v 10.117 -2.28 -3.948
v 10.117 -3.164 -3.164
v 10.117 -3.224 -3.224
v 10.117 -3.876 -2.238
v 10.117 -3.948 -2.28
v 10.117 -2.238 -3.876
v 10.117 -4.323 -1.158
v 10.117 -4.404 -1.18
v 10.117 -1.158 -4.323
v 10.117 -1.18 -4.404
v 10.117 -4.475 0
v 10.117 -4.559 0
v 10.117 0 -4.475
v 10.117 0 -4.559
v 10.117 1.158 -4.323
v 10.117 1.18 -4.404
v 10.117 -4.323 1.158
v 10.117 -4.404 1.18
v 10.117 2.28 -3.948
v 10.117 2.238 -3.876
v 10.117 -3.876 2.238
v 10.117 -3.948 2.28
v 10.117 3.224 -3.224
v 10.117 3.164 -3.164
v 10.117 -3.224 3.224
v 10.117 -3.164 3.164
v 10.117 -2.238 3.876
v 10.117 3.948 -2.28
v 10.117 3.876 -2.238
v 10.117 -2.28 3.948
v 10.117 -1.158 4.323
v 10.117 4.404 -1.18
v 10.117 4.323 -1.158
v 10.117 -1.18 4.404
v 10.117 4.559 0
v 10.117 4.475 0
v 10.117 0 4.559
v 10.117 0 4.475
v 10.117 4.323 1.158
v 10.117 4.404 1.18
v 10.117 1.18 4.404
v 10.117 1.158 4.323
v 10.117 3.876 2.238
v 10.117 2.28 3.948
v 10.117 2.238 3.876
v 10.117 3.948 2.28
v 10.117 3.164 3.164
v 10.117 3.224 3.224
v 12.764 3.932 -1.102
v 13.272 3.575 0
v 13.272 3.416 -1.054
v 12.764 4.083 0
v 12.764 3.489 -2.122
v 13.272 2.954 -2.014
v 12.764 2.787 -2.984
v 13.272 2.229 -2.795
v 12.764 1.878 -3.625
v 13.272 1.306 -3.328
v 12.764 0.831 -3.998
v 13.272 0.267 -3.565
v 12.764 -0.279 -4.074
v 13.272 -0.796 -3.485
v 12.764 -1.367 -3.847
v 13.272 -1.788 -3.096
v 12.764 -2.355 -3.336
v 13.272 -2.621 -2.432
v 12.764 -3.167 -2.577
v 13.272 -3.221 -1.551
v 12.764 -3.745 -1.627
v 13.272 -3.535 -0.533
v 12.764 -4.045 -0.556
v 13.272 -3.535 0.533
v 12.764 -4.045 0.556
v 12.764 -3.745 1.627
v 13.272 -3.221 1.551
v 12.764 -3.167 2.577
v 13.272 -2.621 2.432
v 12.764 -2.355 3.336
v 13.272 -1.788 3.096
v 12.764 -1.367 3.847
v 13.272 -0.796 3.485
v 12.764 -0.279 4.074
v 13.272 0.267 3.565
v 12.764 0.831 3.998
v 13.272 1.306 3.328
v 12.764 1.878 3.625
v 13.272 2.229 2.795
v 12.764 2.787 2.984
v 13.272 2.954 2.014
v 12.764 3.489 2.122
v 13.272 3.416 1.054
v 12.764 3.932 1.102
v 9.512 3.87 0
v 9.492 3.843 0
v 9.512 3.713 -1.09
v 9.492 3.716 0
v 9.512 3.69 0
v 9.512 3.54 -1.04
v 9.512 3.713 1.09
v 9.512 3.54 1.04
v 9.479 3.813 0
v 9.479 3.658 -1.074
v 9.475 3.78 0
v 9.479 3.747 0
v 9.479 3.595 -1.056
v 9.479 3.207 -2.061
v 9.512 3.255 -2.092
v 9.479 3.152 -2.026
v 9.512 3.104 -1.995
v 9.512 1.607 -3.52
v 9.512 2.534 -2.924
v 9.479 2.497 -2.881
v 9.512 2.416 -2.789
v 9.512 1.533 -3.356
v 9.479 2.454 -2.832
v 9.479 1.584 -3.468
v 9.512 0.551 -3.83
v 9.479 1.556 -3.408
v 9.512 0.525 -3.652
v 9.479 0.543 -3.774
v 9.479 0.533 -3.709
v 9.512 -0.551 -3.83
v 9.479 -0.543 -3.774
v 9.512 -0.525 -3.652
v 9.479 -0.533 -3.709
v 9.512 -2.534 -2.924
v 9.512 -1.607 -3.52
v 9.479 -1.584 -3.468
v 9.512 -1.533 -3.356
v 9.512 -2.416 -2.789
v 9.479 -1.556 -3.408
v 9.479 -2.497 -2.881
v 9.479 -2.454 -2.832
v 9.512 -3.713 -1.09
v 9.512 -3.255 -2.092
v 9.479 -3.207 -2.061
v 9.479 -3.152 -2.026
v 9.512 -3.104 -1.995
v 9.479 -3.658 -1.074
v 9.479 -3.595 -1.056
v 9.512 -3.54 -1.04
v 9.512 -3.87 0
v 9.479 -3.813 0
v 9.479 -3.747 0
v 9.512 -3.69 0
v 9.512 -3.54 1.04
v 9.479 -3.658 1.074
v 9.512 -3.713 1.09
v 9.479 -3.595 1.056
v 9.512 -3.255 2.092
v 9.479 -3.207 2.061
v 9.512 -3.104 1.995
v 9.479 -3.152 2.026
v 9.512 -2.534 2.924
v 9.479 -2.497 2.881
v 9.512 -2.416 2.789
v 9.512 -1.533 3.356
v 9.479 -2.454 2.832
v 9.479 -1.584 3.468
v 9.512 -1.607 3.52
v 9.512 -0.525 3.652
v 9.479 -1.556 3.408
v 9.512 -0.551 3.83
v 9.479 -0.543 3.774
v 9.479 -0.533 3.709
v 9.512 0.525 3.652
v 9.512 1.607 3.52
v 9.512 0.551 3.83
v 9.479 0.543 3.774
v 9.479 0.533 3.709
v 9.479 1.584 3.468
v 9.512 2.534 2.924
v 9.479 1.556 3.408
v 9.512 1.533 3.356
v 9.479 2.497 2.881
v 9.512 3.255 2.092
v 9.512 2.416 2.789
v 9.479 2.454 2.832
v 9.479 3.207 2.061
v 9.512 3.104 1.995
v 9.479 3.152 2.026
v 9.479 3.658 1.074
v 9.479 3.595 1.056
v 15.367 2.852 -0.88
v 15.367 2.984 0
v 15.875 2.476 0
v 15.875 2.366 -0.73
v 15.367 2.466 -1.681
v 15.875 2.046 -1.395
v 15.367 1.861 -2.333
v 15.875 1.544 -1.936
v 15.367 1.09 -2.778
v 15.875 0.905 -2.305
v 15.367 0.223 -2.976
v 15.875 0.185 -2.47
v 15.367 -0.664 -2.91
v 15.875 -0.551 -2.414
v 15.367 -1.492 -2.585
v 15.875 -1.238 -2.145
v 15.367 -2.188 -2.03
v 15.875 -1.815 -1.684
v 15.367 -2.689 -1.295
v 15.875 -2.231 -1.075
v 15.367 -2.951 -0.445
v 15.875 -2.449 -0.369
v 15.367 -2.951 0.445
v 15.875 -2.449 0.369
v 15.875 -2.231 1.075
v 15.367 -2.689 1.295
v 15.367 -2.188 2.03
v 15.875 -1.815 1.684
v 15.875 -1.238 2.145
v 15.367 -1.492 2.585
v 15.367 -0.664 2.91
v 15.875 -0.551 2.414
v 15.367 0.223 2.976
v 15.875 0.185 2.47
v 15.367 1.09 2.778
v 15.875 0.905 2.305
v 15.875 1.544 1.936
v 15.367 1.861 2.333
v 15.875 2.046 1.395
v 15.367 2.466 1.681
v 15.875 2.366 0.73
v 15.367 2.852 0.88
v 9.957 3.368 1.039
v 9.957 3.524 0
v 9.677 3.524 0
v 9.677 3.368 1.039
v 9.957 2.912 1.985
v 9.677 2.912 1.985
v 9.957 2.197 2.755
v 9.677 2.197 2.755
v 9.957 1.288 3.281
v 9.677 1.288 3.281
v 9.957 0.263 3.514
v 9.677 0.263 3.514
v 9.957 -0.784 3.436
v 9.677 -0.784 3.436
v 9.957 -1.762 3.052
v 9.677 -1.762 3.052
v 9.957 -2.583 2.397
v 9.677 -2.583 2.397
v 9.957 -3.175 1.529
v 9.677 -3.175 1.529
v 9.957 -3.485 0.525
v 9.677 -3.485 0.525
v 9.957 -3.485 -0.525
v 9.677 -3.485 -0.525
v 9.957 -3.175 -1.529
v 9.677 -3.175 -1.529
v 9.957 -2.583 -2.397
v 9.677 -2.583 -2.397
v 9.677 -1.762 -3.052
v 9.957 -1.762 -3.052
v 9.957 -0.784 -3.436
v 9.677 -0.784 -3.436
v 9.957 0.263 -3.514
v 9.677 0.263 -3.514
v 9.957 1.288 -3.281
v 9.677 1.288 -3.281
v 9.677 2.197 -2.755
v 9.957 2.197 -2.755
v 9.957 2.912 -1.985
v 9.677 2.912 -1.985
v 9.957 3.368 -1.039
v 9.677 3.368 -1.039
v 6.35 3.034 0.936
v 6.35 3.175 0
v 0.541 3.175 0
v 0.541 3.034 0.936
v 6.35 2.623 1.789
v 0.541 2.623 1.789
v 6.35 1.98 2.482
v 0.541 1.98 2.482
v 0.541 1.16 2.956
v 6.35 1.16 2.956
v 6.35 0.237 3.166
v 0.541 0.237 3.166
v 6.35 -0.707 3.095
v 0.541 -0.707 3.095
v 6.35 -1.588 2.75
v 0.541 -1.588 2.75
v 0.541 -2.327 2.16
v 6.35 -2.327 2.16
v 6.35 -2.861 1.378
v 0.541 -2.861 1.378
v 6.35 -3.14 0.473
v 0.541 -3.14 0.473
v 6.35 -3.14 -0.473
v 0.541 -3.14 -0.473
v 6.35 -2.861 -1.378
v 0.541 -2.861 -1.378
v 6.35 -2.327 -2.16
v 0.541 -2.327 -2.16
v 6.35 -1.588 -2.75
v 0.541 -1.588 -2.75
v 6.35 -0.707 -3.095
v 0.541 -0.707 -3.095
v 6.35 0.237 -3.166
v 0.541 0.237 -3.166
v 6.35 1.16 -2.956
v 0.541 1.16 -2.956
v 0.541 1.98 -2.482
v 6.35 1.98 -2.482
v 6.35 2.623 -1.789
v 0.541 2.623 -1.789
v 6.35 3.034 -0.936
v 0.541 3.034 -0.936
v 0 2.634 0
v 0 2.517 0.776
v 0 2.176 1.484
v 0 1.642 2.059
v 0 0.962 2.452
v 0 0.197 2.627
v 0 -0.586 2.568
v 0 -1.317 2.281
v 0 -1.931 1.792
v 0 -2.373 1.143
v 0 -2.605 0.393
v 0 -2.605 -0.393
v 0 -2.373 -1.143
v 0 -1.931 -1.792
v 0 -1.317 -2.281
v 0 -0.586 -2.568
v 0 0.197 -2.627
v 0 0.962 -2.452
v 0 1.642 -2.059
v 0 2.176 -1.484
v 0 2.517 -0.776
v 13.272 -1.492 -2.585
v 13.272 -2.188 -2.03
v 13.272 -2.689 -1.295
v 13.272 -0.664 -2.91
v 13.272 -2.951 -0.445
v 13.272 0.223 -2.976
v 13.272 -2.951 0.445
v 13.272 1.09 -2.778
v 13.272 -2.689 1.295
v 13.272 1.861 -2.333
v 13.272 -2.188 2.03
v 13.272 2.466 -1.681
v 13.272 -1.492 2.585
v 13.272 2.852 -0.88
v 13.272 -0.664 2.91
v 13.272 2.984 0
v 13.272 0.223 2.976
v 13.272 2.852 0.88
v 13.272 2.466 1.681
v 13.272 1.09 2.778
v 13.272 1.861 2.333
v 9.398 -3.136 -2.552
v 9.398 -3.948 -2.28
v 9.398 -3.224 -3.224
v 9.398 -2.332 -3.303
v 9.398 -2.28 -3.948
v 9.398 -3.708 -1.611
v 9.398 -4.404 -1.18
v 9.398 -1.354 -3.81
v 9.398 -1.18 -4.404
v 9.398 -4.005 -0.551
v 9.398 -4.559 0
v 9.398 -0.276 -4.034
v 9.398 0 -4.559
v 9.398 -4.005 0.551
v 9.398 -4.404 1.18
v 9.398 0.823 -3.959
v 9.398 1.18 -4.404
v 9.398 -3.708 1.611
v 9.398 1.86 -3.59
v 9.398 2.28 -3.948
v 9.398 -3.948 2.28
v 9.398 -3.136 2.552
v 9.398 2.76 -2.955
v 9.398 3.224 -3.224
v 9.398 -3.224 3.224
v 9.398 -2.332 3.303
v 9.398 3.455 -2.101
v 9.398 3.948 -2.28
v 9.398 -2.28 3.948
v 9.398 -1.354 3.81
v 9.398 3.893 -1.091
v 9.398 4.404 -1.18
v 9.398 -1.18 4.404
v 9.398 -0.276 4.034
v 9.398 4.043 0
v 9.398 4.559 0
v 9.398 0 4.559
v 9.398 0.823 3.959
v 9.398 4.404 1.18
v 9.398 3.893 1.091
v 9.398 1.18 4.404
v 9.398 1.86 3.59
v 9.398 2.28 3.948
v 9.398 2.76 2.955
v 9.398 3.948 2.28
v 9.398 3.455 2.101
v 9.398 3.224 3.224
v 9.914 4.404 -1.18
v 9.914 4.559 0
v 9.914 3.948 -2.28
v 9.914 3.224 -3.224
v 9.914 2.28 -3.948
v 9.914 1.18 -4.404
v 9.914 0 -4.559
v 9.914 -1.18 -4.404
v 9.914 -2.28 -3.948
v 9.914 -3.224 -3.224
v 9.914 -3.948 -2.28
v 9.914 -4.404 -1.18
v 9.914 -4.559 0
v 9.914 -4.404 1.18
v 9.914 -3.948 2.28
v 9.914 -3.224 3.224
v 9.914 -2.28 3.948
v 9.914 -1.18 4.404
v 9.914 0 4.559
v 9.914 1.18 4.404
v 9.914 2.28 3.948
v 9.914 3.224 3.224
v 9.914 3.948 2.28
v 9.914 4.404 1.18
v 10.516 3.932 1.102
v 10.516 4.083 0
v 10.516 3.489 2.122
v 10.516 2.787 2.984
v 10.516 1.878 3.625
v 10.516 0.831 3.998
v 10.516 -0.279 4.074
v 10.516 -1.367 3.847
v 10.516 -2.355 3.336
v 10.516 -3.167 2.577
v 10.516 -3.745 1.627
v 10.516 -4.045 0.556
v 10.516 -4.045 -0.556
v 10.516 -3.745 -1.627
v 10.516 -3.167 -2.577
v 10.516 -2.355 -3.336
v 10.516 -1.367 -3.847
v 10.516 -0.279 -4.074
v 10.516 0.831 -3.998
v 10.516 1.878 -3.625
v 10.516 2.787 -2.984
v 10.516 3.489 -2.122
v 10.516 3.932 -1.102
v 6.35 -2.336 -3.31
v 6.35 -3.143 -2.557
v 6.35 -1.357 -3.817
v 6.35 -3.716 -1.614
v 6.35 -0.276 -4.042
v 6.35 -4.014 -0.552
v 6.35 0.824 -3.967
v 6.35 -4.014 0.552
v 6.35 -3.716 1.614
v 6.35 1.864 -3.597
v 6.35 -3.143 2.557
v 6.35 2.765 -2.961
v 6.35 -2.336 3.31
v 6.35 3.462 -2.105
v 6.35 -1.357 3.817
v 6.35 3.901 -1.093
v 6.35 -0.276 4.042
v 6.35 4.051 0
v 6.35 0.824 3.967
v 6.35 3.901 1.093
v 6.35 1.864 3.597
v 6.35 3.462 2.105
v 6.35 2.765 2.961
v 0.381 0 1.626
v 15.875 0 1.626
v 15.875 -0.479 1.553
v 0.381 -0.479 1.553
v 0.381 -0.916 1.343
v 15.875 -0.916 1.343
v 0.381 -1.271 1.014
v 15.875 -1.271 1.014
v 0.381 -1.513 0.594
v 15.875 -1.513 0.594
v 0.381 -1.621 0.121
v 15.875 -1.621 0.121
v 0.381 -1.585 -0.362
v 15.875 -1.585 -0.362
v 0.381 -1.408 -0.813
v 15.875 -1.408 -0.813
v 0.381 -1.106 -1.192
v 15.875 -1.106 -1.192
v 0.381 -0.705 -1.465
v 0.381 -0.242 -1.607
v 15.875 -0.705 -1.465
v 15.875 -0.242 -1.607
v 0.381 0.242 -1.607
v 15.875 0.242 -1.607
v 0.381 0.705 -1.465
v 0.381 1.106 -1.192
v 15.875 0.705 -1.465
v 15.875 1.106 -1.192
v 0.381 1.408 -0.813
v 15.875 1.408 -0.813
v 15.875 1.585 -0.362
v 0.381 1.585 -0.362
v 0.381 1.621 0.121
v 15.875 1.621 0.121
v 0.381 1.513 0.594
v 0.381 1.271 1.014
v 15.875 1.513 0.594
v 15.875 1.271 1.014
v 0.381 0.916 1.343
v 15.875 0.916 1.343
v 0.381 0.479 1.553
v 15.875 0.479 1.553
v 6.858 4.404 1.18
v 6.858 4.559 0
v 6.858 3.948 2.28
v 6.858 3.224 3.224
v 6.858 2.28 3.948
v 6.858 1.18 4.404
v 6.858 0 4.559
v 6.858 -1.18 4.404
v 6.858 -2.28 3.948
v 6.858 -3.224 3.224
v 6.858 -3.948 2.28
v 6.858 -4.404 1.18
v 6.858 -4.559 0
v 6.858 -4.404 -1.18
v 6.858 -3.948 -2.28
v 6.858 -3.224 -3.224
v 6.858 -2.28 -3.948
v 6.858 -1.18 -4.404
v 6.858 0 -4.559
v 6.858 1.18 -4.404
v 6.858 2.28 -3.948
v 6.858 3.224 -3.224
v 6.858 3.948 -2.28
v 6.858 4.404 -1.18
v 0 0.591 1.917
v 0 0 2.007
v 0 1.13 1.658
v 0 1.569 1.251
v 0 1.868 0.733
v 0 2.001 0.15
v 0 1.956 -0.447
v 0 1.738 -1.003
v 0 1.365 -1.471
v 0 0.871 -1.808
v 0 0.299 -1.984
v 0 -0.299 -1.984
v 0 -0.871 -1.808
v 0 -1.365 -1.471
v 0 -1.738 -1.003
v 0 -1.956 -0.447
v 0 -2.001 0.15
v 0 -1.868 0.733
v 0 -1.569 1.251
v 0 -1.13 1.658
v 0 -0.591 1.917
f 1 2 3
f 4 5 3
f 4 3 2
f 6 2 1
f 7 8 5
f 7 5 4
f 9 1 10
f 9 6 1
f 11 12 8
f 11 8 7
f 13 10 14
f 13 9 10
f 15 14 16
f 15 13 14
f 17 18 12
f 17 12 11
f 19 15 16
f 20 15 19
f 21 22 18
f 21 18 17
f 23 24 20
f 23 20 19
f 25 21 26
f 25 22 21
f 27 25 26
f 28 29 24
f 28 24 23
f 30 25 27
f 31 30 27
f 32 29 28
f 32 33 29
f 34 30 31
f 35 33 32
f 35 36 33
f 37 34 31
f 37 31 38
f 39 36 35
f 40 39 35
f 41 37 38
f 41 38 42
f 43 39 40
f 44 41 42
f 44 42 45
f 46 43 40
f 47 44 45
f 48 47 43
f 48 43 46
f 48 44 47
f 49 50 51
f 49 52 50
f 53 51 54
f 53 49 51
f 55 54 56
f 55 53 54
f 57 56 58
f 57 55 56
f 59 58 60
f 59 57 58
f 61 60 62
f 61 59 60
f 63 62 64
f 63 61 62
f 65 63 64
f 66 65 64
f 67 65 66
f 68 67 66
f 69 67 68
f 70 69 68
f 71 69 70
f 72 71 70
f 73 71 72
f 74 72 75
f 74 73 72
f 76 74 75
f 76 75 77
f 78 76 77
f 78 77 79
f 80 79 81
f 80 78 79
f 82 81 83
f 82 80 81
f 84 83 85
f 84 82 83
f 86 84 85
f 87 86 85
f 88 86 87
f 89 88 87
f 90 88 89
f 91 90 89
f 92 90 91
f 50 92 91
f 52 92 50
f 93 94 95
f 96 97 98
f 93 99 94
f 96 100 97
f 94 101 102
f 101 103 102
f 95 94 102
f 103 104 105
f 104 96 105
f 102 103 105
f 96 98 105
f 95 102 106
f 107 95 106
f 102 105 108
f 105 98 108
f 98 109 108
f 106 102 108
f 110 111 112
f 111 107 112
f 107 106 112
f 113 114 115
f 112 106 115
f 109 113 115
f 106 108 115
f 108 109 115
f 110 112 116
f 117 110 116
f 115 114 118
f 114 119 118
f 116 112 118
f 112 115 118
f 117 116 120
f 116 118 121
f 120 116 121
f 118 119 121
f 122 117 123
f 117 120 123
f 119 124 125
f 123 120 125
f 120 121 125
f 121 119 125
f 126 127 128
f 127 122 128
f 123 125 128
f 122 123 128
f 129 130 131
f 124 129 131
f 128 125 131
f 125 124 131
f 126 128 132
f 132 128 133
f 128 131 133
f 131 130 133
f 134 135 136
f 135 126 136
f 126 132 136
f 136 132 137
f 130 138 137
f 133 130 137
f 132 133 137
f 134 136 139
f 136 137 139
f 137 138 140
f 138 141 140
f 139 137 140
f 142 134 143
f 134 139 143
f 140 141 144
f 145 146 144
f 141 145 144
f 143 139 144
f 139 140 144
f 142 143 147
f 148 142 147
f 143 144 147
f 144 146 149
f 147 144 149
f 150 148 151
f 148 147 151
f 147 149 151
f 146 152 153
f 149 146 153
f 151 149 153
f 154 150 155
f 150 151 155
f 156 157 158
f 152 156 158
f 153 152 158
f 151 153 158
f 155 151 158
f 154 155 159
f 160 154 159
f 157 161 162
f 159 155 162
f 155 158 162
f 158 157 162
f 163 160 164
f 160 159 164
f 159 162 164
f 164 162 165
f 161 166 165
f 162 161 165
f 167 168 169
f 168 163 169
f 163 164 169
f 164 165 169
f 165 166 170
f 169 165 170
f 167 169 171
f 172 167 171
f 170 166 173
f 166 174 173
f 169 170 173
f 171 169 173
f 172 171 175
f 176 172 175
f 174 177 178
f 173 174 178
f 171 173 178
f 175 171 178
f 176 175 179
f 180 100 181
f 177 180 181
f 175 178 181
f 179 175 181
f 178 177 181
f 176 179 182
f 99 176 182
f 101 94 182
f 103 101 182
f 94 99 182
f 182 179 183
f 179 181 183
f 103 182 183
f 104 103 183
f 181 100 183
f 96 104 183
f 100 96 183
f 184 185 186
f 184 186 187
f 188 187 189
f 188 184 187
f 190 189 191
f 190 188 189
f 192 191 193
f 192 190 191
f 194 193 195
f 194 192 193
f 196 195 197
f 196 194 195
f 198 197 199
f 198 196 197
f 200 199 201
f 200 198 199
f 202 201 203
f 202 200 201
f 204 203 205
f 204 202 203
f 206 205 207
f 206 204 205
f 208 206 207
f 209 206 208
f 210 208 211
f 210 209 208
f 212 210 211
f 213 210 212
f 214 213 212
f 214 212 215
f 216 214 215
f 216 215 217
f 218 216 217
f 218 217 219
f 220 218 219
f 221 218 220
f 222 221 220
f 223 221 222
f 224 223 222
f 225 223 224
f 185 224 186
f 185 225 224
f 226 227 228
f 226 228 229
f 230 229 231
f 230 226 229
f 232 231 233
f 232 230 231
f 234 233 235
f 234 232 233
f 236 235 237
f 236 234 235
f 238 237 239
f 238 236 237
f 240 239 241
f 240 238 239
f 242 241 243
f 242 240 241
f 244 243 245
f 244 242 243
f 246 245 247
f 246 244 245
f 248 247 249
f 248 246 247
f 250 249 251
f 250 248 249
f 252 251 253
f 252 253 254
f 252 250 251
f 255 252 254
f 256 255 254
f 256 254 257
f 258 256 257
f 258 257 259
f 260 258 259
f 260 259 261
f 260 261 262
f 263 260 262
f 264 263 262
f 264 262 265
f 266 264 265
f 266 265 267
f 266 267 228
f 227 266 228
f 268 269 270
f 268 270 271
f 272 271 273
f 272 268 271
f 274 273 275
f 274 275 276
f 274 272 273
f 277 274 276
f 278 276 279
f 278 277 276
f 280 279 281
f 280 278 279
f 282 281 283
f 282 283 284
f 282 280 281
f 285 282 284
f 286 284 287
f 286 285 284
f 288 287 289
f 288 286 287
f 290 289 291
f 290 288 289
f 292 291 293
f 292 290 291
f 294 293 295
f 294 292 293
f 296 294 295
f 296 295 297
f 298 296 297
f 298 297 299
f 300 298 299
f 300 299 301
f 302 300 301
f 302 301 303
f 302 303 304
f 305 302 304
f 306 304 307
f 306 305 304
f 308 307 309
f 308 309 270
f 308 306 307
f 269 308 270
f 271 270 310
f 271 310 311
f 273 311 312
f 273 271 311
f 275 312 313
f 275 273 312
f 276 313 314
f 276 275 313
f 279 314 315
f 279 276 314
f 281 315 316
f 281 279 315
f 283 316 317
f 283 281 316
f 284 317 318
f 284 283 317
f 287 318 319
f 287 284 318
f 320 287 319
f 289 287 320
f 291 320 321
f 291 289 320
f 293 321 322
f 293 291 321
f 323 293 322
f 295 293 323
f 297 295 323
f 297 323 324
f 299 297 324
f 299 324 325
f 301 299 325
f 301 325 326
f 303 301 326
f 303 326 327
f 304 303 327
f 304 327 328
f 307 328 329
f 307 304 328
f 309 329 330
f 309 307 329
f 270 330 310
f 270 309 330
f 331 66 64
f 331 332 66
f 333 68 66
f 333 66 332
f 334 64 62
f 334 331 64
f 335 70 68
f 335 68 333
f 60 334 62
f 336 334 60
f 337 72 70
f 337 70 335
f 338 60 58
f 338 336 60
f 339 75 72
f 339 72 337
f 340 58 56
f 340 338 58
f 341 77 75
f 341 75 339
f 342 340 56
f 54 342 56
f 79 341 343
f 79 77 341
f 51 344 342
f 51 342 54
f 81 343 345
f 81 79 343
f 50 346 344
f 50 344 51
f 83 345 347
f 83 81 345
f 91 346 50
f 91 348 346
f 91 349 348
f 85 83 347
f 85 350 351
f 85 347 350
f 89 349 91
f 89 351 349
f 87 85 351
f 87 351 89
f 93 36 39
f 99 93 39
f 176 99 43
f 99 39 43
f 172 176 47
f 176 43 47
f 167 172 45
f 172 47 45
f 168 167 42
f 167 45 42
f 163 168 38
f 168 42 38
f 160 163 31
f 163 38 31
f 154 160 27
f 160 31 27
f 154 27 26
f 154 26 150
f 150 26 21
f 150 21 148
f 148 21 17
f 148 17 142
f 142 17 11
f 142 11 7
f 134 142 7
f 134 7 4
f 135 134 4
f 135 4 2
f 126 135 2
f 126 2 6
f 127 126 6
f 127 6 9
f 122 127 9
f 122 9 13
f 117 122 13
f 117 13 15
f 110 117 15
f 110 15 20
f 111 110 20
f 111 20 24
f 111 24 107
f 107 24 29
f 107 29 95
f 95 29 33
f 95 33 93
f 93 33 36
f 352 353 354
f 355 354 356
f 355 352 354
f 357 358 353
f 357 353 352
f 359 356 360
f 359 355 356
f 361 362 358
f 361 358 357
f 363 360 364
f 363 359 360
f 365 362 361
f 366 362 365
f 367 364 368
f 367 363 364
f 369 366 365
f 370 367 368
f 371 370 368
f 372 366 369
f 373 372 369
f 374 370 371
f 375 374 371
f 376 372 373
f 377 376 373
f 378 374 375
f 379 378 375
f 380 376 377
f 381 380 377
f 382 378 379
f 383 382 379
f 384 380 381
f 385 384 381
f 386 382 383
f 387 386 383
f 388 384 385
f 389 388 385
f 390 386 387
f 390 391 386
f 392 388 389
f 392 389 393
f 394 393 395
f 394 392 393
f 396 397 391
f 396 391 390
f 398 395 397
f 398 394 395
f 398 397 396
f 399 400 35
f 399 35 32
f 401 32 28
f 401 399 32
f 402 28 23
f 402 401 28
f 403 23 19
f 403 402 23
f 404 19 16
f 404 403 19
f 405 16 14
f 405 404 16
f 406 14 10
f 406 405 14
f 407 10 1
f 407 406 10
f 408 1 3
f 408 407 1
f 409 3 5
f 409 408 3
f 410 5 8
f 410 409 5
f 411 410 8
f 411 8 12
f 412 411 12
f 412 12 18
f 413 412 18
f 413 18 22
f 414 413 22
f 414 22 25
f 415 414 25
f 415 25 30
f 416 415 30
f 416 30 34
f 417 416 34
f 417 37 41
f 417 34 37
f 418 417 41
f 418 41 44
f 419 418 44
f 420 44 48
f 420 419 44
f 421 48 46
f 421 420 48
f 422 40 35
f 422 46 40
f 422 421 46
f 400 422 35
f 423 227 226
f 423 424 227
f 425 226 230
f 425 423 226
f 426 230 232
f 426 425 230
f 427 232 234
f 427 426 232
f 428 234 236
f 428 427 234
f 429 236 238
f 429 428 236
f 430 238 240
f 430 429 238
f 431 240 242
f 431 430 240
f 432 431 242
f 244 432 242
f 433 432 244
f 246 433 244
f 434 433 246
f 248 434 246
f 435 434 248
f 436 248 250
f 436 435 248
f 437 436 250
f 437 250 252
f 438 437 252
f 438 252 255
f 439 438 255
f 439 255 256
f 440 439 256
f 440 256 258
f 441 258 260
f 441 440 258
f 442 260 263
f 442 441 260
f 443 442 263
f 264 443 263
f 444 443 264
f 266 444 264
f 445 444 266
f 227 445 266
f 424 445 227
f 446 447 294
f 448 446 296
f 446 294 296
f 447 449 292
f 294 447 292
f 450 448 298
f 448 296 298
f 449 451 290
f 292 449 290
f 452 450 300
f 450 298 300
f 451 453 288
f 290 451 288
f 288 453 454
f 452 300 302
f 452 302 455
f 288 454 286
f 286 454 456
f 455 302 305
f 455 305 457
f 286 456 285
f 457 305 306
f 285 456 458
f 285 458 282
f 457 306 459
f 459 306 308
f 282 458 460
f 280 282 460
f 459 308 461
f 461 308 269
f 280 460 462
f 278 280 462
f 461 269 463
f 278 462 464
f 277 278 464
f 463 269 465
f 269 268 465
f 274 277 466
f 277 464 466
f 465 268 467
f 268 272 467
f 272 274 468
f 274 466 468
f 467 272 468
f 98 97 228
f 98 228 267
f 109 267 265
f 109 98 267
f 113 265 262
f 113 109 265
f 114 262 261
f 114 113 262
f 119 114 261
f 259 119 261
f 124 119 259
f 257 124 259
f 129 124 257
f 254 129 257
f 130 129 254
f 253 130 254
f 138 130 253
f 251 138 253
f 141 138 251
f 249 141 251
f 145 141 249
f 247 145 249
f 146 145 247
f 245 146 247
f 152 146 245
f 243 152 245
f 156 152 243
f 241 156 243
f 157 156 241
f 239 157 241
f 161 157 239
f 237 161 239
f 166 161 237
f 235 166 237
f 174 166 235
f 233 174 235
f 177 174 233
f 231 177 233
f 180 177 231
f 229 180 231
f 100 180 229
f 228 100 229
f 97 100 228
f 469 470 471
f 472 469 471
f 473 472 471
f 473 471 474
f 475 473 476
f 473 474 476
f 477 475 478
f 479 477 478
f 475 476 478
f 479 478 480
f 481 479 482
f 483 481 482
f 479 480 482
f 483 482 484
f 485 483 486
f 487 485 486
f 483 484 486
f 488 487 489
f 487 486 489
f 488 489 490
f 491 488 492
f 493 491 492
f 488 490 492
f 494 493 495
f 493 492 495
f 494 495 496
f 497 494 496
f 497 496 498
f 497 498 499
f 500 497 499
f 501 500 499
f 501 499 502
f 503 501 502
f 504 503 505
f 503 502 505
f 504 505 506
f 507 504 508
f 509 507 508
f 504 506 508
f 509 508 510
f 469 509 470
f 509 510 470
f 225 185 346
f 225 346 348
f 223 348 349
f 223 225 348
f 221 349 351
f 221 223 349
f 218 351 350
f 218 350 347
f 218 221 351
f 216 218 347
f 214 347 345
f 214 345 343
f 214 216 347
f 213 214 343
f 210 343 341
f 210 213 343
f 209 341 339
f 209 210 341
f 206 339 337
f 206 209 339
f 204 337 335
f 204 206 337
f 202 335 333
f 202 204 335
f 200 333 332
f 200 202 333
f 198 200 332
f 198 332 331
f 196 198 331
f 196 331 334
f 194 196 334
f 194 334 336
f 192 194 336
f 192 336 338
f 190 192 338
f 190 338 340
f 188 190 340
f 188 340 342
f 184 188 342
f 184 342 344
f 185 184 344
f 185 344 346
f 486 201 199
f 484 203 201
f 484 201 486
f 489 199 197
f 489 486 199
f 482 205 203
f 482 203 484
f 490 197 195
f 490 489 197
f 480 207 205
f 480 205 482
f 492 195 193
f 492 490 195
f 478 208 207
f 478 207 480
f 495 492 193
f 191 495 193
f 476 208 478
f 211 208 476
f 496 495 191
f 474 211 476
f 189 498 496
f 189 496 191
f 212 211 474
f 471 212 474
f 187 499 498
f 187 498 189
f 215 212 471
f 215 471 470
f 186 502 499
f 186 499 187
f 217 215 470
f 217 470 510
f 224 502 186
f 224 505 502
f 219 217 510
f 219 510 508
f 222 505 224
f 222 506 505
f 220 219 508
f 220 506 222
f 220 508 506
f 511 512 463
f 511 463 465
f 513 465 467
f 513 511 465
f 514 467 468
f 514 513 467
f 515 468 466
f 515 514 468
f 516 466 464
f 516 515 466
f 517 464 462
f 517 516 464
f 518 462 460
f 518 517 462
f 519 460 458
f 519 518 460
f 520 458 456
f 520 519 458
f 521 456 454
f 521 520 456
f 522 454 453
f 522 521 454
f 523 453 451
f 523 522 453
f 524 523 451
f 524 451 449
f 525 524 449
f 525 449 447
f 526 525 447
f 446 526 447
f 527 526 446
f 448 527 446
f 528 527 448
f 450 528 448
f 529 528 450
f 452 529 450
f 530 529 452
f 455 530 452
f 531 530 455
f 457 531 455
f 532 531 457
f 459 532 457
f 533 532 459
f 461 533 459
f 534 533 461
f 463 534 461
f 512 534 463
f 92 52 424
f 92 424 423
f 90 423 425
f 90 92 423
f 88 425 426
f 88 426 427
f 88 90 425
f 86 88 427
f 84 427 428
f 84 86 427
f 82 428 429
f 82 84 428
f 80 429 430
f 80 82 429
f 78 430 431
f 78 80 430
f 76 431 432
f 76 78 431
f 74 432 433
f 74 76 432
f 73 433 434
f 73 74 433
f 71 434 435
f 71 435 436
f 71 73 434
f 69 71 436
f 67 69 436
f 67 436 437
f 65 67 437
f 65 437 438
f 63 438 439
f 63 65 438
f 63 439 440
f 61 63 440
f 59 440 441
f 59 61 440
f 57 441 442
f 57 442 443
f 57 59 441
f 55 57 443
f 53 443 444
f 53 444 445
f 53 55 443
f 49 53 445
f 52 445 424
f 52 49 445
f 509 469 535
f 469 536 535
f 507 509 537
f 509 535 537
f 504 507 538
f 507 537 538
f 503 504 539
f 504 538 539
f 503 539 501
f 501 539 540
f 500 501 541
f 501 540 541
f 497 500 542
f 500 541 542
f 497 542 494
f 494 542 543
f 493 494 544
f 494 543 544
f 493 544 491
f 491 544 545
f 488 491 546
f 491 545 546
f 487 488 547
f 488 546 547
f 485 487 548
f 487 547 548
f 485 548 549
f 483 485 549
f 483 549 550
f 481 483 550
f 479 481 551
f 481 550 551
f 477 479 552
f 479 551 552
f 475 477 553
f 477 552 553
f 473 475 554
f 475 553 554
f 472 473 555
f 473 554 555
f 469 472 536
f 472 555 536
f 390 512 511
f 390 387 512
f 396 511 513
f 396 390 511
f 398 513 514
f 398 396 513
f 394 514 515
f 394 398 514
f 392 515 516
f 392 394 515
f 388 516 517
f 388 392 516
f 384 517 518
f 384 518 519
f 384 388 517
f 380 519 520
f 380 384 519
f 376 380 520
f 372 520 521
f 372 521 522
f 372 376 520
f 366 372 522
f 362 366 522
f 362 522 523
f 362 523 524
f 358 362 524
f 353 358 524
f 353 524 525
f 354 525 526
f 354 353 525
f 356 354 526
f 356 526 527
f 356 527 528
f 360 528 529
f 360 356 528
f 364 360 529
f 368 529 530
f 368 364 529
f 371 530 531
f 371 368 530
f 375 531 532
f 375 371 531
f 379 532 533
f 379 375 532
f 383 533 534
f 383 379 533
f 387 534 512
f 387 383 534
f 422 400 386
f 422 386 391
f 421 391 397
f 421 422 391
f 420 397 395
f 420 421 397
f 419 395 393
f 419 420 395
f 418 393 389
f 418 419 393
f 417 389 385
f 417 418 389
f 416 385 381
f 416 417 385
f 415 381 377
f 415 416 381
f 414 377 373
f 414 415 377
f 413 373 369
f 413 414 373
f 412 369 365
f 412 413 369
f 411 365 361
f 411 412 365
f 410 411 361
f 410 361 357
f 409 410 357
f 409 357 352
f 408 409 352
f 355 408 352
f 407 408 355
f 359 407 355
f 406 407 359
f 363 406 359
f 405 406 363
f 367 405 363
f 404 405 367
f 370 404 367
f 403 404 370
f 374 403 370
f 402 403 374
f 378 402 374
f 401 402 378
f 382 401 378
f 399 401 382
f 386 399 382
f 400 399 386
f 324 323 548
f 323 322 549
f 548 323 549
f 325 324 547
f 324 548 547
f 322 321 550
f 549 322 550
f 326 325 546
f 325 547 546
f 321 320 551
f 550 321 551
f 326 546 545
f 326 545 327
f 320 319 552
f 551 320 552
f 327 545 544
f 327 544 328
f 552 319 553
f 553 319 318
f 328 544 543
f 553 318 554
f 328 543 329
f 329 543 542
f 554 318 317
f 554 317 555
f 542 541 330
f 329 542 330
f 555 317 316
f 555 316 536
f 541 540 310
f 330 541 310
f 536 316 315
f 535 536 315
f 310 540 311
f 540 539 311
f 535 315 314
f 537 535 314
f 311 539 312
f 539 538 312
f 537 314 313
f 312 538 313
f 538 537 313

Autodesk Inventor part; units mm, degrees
sketch "Sketch_1" plane through (0, 0, 0) normal (0, 0, 1) x (1, 0, 0)
  line L0 (6.35, 0) -> (0, 0)
  line L1 (0, 0) -> (0, 2.634)
  line L2 (0, 2.634) -> (0.541, 3.175)
  line L3 (0.541, 3.175) -> (6.35, 3.175)
  line L4 (6.35, 3.175) -> (6.35, 0)
  line L5 (6.35, 0) -> (0, 0)
revolve "Revolution1" add sketch "Sketch_1" angle 360 about axis through (6.35, 0, 0) along (1, 0, 0)
thread "Thread1" size "1/4-28 UNF" class "2A" standard "ANSI Unified Screw Threads" full length
sketch "Sketch_3" plane through (0, 0, 0) normal (0, 0, 1) x (1, 0, 0)
  line L0 (13.2715, 0) -> (6.35, 0)
  line L1 (6.35, 0) -> (6.35, 4.0513)
  line L2 (6.35, 4.0513) -> (6.858, 4.5593)
  line L3 (6.858, 4.5593) -> (9.398, 4.5593)
  line L4 (9.398, 4.5593) -> (9.398, 3.5242)
  line L5 (9.398, 3.5242) -> (9.9568, 3.5242)
  line L6 (9.9568, 3.5242) -> (10.5156, 4.0831)
  line L7 (10.5156, 4.0831) -> (12.7635, 4.0831)
  line L8 (12.7635, 4.0831) -> (13.2715, 3.5751)
  line L9 (13.2715, 3.5751) -> (13.2715, 0)
  line L10 (13.2715, 0) -> (6.35, 0)
revolve "Revolution2" add sketch "Sketch_3" angle 360 about axis through (13.2715, 0, 0) along (1, 0, 0)
sketch "Sketch_4" plane through (0, 0, 0) normal (0, 0, 1) x (1, 0, 0)
  line L0 (15.875, 0) -> (13.2715, 0)
  line L1 (13.2715, 0) -> (13.2715, 2.9845)
  line L2 (13.2715, 2.9845) -> (15.367, 2.9845)
  line L3 (15.367, 2.9845) -> (15.875, 2.4765)
  line L4 (15.875, 2.4765) -> (15.875, 0)
  line L5 (15.875, 0) -> (13.2715, 0)
revolve "Revolution3" add sketch "Sketch_4" angle 360 about axis through (15.875, 0, 0) along (1, 0, 0)
sketch "Sketch4" plane through (0, 0, 0) normal (-1, 0, 0) x (0, 0, 1)
  point P0 (0, 0)
hole "Hole1" at (0, 0, 0) direction (1, 0, 0) diameter 3.2512 depth 15.875 countersink diameter 4.0132 countersink angle 90
sketch "Sketch_47" plane through (0, 0, 0) normal (0, 0, 1) x (1, 0, 0)
  line L0 (9.9568, 0) -> (9.398, 0)
  line L1 (9.398, 4.0431) -> (9.398, 3.2702)
  line L2 (9.398, 3.2702) -> (9.9568, 3.2702)
  line L3 (9.9568, 3.2702) -> (9.9568, 3.5242)
  line L4 (9.9568, 3.5242) -> (9.6774, 3.5242)
  line L5 (9.6774, 3.5242) -> (9.5118, 3.6899)
  arc A0 (9.5118, 3.8695) -> (9.5118, 3.6899) centre (9.6016, 3.7797) ccw
  line L6 (9.5118, 3.8695) -> (10.1174, 4.4751)
  line L7 (10.1174, 4.4751) -> (10.1174, 4.5593)
  line L8 (10.1174, 4.5593) -> (9.9142, 4.5593)
  line L9 (9.9142, 4.5593) -> (9.398, 4.0431)
revolve "Revolution4" add sketch "Sketch_47" angle 360 about axis through (9.9568, 0, 0) along (1, 0, 0)
ref_plane "hh_XY" through (0, 3.175, 0) normal (0, 0, 1) x (1, 0, 0)
ref_plane "hh_YZ" through (0, 3.175, 0) normal (1, 0, 0) x (0, 1, 0)
ref_plane "hh_ZX" through (0, 3.175, 0) normal (0, 1, 0) x (0, 0, 1)
ref_plane "rod_guide_XY" through (0, 0, 0) normal (1, 0, 0) x (0, 0, -1)
ref_plane "rod_guide_YZ" through (0, 0, 0) normal (0, 0, -1) x (0, 1, 0)
ref_plane "rod_guide_ZX" through (0, 0, 0) normal (0, 1, 0) x (1, 0, 0)
ref_plane "t1_XY" through (6.35, 0, 0) normal (1, 0, 0) x (0, 0, -1)
ref_plane "t1_YZ" through (6.35, 0, 0) normal (0, 0, -1) x (0, 1, 0)
ref_plane "t1_ZX" through (6.35, 0, 0) normal (0, 1, 0) x (1, 0, 0)
ref_plane "t111_XY" through (6.35, 0, 0) normal (1, 0, 0) x (0, 0, -1)
ref_plane "t111_YZ" through (6.35, 0, 0) normal (0, 0, -1) x (0, 1, 0)
ref_plane "t111_ZX" through (6.35, 0, 0) normal (0, 1, 0) x (1, 0, 0)
ref_plane "to_foot_bracket_XY" through (6.35, 0, 0) normal (1, 0, 0) x (0, 0, -1)
ref_plane "to_foot_bracket_YZ" through (6.35, 0, 0) normal (0, 0, -1) x (0, 1, 0)
ref_plane "to_foot_bracket_ZX" through (6.35, 0, 0) normal (0, 1, 0) x (1, 0, 0)
ref_plane "to_nut_XY" through (6.35, 0, 0) normal (1, 0, 0) x (0, 0, -1)
ref_plane "to_nut_YZ" through (6.35, 0, 0) normal (0, 0, -1) x (0, 1, 0)
ref_plane "to_nut_ZX" through (6.35, 0, 0) normal (0, 1, 0) x (1, 0, 0)
ref_plane "to_rod_XY" through (0, 0, 0) normal (1, 0, 0) x (0, 0, -1)
ref_plane "to_rod_YZ" through (0, 0, 0) normal (0, 0, -1) x (0, 1, 0)
ref_plane "to_rod_ZX" through (0, 0, 0) normal (0, 1, 0) x (1, 0, 0)
ref_plane "to_screw_XY" through (6.35, 0, 0) normal (0, 1, 0) x (1, 0, 0)
ref_plane "to_screw_YZ" through (6.35, 0, 0) normal (1, 0, 0) x (0, 0, -1)
ref_plane "to_screw_ZX" through (6.35, 0, 0) normal (0, 0, -1) x (0, 1, 0)
ref_plane "to_trunnion_brackets_XY" through (0, 0, 0) normal (0, 1, 0) x (1, 0, 0)
ref_plane "to_trunnion_brackets_YZ" through (0, 0, 0) normal (1, 0, 0) x (0, 0, -1)
ref_plane "to_trunnion_brackets_ZX" through (0, 0, 0) normal (0, 0, -1) x (0, 1, 0)
ref_plane "to_trunnion_brackets1_XY" through (0, 6.35, 0) normal (0, 1, 0) x (1, 0, 0)
ref_plane "to_trunnion_brackets1_YZ" through (0, 6.35, 0) normal (1, 0, 0) x (0, 0, -1)
ref_plane "to_trunnion_brackets1_ZX" through (0, 6.35, 0) normal (0, 0, -1) x (0, 1, 0)
ref_plane "to_trunnion_brackets2_XY" through (0, -6.35, 0) normal (0, 1, 0) x (1, 0, 0)
ref_plane "to_trunnion_brackets2_YZ" through (0, -6.35, 0) normal (1, 0, 0) x (0, 0, -1)
ref_plane "to_trunnion_brackets2_ZX" through (0, -6.35, 0) normal (0, 0, -1) x (0, 1, 0)
ref_plane "to_tube_XY" through (9.9568, 0, 0) normal (1, 0, 0) x (0, 0, -1)
ref_plane "to_tube_YZ" through (9.9568, 0, 0) normal (0, 0, -1) x (0, 1, 0)
ref_plane "to_tube_ZX" through (9.9568, 0, 0) normal (0, 1, 0) x (1, 0, 0)
properties part number "007000-0_rod_guide"
